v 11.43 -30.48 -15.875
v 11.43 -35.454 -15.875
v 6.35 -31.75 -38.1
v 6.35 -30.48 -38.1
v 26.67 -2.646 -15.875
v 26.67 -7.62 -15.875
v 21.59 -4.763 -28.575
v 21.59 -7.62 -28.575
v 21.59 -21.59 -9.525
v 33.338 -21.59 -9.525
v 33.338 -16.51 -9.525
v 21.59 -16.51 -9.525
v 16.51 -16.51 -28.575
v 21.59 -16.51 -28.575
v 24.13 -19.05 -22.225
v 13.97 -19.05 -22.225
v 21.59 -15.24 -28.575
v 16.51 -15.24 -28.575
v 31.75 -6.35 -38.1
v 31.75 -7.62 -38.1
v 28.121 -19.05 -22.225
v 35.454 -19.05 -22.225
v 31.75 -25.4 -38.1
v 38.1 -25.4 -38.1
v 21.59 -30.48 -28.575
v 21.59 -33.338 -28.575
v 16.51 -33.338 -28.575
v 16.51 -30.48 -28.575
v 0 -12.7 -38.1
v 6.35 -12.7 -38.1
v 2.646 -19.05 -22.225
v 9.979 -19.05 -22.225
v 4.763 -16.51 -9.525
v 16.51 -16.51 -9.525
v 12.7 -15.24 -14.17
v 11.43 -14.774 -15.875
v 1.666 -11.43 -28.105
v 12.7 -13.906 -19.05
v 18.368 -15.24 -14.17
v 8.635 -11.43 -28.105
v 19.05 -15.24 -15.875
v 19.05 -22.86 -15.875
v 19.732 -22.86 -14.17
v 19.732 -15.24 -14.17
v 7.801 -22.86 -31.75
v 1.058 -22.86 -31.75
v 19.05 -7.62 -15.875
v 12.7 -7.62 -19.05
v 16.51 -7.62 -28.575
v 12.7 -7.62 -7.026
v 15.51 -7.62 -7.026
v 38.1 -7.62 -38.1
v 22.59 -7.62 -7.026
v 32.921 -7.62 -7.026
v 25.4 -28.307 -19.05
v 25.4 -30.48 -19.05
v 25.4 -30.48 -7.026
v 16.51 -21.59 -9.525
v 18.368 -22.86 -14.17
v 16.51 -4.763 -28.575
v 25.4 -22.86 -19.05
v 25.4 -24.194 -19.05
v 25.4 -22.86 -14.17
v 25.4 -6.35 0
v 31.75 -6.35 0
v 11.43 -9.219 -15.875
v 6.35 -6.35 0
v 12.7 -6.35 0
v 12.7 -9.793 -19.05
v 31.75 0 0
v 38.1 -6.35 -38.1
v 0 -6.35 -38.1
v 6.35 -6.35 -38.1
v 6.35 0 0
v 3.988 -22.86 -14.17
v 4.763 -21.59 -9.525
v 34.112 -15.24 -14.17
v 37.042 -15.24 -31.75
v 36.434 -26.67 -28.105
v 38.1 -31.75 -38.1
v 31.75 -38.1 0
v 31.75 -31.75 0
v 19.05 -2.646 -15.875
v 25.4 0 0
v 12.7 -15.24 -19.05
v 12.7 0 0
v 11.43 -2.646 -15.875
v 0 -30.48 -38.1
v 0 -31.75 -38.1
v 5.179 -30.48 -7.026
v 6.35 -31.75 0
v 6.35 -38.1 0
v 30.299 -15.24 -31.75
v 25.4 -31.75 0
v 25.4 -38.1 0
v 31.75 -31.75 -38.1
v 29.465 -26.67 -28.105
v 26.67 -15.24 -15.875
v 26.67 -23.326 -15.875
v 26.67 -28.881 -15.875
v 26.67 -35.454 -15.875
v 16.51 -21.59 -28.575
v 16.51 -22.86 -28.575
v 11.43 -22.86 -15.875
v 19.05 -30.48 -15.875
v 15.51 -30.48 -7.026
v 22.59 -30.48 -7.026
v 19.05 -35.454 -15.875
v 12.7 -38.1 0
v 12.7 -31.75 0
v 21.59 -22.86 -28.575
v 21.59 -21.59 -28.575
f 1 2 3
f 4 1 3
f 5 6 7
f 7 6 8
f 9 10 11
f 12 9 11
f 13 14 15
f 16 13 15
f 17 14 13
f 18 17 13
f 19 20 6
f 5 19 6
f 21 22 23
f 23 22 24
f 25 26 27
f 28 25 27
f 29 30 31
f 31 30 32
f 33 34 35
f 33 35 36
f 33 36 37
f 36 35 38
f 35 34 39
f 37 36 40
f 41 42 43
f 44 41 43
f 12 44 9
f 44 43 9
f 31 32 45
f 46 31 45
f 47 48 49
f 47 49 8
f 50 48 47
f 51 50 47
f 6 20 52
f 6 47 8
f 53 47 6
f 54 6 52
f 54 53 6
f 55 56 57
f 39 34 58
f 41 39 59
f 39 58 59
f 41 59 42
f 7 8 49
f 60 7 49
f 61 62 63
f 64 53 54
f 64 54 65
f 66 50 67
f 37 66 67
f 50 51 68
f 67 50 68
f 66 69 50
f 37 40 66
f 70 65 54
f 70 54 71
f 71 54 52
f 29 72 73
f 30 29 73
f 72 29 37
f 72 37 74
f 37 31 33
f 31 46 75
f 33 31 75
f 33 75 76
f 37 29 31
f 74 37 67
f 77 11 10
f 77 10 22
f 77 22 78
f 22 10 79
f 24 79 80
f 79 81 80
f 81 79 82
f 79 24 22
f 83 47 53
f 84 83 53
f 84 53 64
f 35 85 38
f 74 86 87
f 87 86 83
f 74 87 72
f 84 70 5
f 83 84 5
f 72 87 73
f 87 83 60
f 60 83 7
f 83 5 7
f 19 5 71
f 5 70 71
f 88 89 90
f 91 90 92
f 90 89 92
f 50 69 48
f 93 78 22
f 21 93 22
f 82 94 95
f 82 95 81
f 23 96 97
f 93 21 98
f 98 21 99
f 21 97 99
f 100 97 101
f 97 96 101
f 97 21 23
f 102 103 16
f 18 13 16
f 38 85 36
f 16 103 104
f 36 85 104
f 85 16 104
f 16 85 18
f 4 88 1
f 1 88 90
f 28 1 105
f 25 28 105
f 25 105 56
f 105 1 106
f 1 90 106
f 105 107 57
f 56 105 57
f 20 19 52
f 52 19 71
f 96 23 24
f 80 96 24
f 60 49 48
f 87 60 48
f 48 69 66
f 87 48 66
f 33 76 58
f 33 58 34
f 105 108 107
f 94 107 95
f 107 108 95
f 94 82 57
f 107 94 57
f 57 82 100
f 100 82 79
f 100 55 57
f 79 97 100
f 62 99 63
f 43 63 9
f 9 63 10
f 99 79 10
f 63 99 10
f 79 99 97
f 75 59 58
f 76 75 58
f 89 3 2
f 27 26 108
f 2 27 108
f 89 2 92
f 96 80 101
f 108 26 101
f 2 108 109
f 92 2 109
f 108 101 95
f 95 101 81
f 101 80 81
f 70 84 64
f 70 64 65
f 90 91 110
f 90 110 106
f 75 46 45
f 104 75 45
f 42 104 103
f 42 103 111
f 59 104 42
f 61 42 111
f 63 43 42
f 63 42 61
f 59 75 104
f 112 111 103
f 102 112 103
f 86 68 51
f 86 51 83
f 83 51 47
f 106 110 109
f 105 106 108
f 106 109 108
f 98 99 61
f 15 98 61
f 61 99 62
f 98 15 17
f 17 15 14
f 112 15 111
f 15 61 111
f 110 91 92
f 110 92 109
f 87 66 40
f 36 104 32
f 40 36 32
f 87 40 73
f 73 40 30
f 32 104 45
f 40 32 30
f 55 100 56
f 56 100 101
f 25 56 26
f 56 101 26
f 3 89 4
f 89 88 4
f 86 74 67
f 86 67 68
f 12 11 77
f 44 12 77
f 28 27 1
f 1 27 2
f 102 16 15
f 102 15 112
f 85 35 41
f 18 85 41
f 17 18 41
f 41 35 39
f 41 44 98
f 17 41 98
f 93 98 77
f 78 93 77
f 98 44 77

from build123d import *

# Parameters (mm, degrees)
F0_W     = 38.1
F0_H     = 38.1
F1_DEPTH = 38.1
F5_DEPTH = 38.1
F7_DEPTH = 38.1
F8_W     = 25.4
F8_H     = 7.62
F9_DEPTH = 38.1


with BuildPart() as f1:
    # F0 (on Front) → F1 (new body)
    with BuildSketch(Plane.XZ):
        with Locations((19.05, -19.05)):
            Rectangle(F0_W, F0_H)
    extrude(amount=F1_DEPTH)

    # F4 (on offset) → F5 (cut)
    with BuildSketch(Plane.YZ.offset(38.1)):
        Polygon((-31.75, -38.1), (-38.1, 0), (-38.1, -38.1), align=None)
        Polygon((-11.43, -28.104628), (-6.35, 0), (-31.75, 0), (-26.67, -28.104628), (-21.59, -9.525), (-16.51, -9.525), align=None)
        Polygon((-25.4, -38.1), (-12.7, -38.1), (-19.05, -22.225), align=None)
        Polygon((0, -32.925924), (0, 0), (-6.35, -38.1), (0, -38.1), align=None)
    extrude(amount=-F5_DEPTH, mode=Mode.SUBTRACT)

    # F6 (on offset) → F7 (cut)
    with BuildSketch(Plane.XZ.offset(38.1)):
        Polygon((6.35, 0), (0, 0), (0, -38.1), align=None)
        Polygon((25.4, 0), (12.7, 0), (19.05, -15.875), align=None)
        Polygon((11.43, -15.875), (6.35, -38.1), (31.75, -38.1), (26.67, -15.875), (21.59, -28.575), (16.51, -28.575), align=None)
        Polygon((38.1, 0), (31.75, 0), (38.1, -38.1), align=None)
    extrude(amount=-F7_DEPTH, mode=Mode.SUBTRACT)

    # F8 (on Top) → F9 (cut)
    with BuildSketch(Plane.XY):
        with Locations((25.4, -11.43)):
            Rectangle(F8_W, F8_H)
        with Locations((12.7, -26.67)):
            Rectangle(F8_W, F8_H)
    extrude(amount=-F9_DEPTH, mode=Mode.SUBTRACT)


solid = f1.part
